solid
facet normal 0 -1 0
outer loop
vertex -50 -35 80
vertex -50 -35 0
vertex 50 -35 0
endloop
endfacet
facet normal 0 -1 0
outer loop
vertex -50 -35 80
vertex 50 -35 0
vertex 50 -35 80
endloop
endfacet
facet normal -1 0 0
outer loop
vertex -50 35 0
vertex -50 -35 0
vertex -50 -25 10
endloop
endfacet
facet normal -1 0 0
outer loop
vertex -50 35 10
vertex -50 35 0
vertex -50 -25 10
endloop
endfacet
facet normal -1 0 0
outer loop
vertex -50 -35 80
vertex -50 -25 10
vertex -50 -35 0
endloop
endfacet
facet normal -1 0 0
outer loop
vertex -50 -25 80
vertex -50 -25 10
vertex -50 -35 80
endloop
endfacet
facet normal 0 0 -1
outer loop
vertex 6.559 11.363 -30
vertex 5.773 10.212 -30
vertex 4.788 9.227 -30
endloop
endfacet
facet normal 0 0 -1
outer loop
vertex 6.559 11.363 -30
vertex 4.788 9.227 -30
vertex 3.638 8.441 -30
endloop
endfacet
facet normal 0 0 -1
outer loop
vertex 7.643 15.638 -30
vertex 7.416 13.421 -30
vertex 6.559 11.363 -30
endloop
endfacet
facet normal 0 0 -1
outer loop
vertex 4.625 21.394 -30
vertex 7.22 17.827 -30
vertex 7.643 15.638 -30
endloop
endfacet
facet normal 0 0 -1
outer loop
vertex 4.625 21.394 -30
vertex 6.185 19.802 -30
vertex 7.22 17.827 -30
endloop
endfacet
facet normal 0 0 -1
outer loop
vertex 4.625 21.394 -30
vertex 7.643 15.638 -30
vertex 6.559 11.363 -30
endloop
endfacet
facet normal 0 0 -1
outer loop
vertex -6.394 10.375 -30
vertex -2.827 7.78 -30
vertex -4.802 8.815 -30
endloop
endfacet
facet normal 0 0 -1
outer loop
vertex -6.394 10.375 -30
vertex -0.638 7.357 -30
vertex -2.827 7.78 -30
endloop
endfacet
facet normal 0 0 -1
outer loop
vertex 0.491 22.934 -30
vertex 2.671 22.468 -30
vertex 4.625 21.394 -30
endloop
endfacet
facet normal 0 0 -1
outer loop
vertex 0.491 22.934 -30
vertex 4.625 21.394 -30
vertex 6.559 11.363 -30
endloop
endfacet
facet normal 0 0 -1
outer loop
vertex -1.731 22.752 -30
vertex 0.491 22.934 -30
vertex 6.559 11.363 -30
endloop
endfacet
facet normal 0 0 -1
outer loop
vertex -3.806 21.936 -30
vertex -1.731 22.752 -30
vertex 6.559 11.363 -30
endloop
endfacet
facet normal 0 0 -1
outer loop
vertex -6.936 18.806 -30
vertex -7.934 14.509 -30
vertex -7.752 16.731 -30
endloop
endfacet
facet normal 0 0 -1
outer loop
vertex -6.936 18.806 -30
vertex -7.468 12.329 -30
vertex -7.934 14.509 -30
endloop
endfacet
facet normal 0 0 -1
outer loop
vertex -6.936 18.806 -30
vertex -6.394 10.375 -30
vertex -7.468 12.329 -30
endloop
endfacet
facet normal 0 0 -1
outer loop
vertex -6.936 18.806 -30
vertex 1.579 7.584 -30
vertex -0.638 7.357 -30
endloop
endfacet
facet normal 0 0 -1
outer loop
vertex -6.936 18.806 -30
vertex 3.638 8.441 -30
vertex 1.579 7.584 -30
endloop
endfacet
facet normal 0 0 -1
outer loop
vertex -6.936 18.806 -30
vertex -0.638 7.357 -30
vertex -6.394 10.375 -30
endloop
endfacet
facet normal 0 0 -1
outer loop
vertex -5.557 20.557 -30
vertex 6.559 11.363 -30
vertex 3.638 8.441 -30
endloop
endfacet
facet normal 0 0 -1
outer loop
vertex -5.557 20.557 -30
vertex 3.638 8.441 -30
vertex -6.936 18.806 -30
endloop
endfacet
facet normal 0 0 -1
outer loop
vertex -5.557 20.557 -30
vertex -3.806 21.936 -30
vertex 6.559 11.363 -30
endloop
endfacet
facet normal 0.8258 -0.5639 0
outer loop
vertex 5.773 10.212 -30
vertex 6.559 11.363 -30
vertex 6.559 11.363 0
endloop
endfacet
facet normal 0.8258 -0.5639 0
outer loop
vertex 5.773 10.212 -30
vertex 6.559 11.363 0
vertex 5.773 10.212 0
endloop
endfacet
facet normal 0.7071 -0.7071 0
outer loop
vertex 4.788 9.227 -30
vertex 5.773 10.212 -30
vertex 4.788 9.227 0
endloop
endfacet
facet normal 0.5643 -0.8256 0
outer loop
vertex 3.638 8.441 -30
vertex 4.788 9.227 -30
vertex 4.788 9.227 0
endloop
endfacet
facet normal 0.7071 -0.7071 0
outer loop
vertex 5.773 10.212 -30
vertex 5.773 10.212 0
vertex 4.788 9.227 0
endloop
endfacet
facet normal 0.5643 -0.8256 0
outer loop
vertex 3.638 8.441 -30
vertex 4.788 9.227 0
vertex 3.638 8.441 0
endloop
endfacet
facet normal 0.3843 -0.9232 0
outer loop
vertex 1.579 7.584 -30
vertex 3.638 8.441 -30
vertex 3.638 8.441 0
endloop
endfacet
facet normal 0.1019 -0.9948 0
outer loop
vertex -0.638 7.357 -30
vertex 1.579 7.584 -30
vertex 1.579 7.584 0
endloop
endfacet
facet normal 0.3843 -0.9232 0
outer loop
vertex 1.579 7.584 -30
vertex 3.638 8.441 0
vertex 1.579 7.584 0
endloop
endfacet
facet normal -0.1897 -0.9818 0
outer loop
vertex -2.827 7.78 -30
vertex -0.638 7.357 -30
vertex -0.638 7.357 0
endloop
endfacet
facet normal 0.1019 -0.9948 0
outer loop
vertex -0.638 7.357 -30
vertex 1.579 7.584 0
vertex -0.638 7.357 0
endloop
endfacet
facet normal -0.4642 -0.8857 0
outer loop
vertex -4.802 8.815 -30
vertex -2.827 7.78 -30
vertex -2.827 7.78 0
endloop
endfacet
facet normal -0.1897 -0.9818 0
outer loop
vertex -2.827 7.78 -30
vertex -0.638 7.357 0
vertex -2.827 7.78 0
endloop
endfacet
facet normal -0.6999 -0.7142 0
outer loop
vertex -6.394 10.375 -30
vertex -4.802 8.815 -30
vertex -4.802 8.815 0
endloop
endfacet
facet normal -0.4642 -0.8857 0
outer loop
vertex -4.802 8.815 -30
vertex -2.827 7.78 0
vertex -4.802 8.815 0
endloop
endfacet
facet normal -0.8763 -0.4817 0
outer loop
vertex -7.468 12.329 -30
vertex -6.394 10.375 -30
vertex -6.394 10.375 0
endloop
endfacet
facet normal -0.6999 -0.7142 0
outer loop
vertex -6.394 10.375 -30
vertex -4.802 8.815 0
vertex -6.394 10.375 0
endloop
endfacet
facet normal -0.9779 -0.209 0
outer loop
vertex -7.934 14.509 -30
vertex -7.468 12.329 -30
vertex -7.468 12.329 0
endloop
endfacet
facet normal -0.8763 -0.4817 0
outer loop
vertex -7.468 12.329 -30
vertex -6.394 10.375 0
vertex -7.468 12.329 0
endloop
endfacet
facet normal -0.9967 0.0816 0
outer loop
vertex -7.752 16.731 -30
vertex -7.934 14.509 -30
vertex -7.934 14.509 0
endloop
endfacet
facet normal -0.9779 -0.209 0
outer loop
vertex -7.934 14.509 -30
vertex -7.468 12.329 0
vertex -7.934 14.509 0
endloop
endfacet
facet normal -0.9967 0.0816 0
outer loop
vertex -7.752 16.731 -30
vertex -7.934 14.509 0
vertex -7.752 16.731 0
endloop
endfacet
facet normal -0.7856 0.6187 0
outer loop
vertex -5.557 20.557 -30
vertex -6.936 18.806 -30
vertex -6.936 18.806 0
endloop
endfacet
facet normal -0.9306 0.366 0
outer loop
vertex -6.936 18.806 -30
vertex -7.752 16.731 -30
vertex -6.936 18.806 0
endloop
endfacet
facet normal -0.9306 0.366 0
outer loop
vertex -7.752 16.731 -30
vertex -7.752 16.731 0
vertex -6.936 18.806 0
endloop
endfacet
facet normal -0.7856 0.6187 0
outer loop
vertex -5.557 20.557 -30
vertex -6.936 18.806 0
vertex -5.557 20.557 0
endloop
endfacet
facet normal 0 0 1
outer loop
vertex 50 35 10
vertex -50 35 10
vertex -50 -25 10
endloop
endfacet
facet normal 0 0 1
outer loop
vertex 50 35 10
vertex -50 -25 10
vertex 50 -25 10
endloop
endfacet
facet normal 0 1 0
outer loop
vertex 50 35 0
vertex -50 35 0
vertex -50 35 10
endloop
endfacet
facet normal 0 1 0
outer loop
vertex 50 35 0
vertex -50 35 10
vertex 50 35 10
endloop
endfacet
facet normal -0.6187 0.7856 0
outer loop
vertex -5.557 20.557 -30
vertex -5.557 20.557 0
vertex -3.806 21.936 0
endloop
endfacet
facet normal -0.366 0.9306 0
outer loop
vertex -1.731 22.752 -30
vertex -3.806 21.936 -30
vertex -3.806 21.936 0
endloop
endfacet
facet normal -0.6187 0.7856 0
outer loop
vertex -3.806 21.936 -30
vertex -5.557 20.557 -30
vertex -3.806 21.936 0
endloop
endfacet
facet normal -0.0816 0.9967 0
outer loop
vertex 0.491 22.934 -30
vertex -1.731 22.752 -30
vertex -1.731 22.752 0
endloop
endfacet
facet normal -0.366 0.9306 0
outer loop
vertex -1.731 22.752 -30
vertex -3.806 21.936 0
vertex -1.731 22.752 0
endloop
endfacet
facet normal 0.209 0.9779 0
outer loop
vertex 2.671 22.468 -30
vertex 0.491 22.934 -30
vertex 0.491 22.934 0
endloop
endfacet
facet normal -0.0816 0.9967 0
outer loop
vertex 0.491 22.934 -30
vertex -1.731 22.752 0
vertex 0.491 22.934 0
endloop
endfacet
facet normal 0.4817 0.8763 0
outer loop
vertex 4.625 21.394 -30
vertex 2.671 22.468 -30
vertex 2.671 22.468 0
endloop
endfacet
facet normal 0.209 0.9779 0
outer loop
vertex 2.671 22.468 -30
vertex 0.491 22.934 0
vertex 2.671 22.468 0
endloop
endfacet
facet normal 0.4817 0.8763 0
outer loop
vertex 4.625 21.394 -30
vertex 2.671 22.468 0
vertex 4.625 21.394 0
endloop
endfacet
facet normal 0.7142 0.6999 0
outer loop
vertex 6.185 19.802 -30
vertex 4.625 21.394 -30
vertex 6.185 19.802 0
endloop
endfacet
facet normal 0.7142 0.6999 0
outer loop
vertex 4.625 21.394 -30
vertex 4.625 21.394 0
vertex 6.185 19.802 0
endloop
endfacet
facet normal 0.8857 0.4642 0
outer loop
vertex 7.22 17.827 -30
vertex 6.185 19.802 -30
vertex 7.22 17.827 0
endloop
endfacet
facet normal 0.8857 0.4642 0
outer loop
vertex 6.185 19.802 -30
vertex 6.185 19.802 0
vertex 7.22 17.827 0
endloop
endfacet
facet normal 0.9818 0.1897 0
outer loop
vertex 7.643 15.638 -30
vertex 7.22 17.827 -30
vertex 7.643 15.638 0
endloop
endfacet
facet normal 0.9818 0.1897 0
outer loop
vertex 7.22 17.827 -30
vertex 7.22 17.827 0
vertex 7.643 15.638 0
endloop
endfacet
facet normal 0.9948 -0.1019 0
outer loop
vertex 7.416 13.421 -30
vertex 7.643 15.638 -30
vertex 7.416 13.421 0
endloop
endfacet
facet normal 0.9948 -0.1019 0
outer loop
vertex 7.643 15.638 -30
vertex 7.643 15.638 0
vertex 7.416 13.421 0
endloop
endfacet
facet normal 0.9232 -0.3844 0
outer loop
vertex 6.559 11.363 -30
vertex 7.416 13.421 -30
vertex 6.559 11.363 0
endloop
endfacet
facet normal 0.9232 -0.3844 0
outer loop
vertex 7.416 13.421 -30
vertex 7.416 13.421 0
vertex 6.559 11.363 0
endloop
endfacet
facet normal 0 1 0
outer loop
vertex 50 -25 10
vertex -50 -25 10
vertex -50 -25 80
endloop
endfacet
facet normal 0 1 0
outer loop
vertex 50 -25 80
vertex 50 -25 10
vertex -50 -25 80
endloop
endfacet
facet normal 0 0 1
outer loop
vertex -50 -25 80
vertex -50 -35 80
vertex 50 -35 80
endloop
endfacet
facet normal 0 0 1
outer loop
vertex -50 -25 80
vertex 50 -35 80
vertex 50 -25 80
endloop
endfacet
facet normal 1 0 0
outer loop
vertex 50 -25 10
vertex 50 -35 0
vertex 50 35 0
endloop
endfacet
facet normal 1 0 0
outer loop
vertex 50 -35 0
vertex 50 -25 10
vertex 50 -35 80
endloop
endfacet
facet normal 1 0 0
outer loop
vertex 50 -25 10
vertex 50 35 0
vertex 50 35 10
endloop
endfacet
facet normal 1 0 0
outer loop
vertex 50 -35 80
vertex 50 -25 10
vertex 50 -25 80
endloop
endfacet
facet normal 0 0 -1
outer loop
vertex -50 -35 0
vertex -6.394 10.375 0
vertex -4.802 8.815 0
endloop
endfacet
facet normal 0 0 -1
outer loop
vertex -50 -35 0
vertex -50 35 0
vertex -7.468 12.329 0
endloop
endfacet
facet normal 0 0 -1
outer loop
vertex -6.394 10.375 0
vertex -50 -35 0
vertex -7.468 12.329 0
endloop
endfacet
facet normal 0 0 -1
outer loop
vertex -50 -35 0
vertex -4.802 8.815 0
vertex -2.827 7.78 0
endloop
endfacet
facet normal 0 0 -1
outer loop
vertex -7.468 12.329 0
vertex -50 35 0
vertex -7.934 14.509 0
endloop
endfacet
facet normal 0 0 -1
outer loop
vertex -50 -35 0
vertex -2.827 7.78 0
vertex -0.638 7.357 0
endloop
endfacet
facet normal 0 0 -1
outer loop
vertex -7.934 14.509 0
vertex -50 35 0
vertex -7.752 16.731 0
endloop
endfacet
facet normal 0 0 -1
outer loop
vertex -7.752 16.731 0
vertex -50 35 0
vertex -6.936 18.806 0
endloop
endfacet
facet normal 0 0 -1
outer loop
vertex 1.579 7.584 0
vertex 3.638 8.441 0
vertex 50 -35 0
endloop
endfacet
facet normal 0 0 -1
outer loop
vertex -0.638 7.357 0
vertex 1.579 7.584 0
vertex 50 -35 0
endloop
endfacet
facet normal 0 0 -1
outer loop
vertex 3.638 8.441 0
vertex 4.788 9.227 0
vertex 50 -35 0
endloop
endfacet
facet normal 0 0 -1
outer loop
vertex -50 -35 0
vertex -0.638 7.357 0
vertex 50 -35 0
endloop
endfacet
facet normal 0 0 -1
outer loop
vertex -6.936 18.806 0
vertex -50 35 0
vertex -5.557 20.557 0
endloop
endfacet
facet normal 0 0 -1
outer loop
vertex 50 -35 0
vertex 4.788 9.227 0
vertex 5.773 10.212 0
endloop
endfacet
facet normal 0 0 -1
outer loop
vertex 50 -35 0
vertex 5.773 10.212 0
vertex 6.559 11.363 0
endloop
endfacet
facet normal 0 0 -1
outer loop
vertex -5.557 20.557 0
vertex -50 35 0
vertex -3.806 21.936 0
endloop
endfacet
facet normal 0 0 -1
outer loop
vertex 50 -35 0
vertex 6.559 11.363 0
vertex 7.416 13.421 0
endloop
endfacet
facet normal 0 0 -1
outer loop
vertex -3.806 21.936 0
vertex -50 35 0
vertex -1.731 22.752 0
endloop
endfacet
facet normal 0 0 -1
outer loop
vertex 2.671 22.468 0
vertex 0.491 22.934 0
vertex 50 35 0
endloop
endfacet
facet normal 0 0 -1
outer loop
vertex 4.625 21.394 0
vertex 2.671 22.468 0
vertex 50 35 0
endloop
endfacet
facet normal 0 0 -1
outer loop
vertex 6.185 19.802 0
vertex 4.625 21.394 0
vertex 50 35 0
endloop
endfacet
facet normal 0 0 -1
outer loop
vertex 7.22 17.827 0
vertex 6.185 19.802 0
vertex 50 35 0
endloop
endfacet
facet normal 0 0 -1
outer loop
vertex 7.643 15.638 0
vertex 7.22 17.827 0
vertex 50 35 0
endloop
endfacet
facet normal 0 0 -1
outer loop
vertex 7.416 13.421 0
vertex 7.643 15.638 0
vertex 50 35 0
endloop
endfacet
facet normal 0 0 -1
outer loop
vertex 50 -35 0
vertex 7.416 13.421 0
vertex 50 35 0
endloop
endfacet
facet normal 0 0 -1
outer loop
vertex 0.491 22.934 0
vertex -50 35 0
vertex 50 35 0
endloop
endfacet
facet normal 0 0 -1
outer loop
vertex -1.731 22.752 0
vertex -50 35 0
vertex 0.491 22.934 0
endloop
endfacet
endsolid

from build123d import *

# Parameters (mm, degrees)
SKETCH1_W           = 100
SKETCH1_H           = 70
BOSS_EXTRUDE1_DEPTH = 10
SKETCH2_W           = 70
SKETCH2_H           = 10
BOSS_EXTRUDE3_DEPTH = 100
SKETCH3_R           = 7.5
BOSS_EXTRUDE4_DEPTH = 30
SKETCH4_R           = 7.65
BOSS_EXTRUDE5_DEPTH = 30
SKETCH5_R           = 7.65
BOSS_EXTRUDE6_DEPTH = 30


with BuildPart() as part:
    # Sketch1 → Boss-Extrude1 (new body)
    with BuildSketch(Plane.XY):
        Rectangle(SKETCH1_W, SKETCH1_H)
    extrude(amount=BOSS_EXTRUDE1_DEPTH)

    # Sketch2 → Boss-Extrude3 (add)
    with BuildSketch(Plane.ZY.offset(50)):
        with Locations((45, -30)):
            Rectangle(SKETCH2_W, SKETCH2_H)
    extrude(amount=-BOSS_EXTRUDE3_DEPTH)

    # Sketch3 → Boss-Extrude4 (add)
    with BuildSketch(Plane(origin=(0, 0, 0), x_dir=(-1, 0, 0), z_dir=(0, 0, -1))):
        with Locations(Location((0, 15, 0), (0, 0, 180))):
            Circle(SKETCH3_R)
    extrude(amount=BOSS_EXTRUDE4_DEPTH)

    # Sketch4 → Boss-Extrude5 (add)
    with BuildSketch(Plane(origin=(0, 0, 0), x_dir=(-1, 0, 0), z_dir=(0, 0, -1))):
        with Locations((0, 15.3)):
            Circle(SKETCH4_R)
    extrude(amount=BOSS_EXTRUDE5_DEPTH)

    # Sketch5 → Boss-Extrude6 (add)
    with BuildSketch(Plane(origin=(0, 0, 0), x_dir=(-1, 0, 0), z_dir=(0, 0, -1))):
        with Locations((0.3, 15)):
            Circle(SKETCH5_R)
    extrude(amount=BOSS_EXTRUDE6_DEPTH)


solid = part.part
